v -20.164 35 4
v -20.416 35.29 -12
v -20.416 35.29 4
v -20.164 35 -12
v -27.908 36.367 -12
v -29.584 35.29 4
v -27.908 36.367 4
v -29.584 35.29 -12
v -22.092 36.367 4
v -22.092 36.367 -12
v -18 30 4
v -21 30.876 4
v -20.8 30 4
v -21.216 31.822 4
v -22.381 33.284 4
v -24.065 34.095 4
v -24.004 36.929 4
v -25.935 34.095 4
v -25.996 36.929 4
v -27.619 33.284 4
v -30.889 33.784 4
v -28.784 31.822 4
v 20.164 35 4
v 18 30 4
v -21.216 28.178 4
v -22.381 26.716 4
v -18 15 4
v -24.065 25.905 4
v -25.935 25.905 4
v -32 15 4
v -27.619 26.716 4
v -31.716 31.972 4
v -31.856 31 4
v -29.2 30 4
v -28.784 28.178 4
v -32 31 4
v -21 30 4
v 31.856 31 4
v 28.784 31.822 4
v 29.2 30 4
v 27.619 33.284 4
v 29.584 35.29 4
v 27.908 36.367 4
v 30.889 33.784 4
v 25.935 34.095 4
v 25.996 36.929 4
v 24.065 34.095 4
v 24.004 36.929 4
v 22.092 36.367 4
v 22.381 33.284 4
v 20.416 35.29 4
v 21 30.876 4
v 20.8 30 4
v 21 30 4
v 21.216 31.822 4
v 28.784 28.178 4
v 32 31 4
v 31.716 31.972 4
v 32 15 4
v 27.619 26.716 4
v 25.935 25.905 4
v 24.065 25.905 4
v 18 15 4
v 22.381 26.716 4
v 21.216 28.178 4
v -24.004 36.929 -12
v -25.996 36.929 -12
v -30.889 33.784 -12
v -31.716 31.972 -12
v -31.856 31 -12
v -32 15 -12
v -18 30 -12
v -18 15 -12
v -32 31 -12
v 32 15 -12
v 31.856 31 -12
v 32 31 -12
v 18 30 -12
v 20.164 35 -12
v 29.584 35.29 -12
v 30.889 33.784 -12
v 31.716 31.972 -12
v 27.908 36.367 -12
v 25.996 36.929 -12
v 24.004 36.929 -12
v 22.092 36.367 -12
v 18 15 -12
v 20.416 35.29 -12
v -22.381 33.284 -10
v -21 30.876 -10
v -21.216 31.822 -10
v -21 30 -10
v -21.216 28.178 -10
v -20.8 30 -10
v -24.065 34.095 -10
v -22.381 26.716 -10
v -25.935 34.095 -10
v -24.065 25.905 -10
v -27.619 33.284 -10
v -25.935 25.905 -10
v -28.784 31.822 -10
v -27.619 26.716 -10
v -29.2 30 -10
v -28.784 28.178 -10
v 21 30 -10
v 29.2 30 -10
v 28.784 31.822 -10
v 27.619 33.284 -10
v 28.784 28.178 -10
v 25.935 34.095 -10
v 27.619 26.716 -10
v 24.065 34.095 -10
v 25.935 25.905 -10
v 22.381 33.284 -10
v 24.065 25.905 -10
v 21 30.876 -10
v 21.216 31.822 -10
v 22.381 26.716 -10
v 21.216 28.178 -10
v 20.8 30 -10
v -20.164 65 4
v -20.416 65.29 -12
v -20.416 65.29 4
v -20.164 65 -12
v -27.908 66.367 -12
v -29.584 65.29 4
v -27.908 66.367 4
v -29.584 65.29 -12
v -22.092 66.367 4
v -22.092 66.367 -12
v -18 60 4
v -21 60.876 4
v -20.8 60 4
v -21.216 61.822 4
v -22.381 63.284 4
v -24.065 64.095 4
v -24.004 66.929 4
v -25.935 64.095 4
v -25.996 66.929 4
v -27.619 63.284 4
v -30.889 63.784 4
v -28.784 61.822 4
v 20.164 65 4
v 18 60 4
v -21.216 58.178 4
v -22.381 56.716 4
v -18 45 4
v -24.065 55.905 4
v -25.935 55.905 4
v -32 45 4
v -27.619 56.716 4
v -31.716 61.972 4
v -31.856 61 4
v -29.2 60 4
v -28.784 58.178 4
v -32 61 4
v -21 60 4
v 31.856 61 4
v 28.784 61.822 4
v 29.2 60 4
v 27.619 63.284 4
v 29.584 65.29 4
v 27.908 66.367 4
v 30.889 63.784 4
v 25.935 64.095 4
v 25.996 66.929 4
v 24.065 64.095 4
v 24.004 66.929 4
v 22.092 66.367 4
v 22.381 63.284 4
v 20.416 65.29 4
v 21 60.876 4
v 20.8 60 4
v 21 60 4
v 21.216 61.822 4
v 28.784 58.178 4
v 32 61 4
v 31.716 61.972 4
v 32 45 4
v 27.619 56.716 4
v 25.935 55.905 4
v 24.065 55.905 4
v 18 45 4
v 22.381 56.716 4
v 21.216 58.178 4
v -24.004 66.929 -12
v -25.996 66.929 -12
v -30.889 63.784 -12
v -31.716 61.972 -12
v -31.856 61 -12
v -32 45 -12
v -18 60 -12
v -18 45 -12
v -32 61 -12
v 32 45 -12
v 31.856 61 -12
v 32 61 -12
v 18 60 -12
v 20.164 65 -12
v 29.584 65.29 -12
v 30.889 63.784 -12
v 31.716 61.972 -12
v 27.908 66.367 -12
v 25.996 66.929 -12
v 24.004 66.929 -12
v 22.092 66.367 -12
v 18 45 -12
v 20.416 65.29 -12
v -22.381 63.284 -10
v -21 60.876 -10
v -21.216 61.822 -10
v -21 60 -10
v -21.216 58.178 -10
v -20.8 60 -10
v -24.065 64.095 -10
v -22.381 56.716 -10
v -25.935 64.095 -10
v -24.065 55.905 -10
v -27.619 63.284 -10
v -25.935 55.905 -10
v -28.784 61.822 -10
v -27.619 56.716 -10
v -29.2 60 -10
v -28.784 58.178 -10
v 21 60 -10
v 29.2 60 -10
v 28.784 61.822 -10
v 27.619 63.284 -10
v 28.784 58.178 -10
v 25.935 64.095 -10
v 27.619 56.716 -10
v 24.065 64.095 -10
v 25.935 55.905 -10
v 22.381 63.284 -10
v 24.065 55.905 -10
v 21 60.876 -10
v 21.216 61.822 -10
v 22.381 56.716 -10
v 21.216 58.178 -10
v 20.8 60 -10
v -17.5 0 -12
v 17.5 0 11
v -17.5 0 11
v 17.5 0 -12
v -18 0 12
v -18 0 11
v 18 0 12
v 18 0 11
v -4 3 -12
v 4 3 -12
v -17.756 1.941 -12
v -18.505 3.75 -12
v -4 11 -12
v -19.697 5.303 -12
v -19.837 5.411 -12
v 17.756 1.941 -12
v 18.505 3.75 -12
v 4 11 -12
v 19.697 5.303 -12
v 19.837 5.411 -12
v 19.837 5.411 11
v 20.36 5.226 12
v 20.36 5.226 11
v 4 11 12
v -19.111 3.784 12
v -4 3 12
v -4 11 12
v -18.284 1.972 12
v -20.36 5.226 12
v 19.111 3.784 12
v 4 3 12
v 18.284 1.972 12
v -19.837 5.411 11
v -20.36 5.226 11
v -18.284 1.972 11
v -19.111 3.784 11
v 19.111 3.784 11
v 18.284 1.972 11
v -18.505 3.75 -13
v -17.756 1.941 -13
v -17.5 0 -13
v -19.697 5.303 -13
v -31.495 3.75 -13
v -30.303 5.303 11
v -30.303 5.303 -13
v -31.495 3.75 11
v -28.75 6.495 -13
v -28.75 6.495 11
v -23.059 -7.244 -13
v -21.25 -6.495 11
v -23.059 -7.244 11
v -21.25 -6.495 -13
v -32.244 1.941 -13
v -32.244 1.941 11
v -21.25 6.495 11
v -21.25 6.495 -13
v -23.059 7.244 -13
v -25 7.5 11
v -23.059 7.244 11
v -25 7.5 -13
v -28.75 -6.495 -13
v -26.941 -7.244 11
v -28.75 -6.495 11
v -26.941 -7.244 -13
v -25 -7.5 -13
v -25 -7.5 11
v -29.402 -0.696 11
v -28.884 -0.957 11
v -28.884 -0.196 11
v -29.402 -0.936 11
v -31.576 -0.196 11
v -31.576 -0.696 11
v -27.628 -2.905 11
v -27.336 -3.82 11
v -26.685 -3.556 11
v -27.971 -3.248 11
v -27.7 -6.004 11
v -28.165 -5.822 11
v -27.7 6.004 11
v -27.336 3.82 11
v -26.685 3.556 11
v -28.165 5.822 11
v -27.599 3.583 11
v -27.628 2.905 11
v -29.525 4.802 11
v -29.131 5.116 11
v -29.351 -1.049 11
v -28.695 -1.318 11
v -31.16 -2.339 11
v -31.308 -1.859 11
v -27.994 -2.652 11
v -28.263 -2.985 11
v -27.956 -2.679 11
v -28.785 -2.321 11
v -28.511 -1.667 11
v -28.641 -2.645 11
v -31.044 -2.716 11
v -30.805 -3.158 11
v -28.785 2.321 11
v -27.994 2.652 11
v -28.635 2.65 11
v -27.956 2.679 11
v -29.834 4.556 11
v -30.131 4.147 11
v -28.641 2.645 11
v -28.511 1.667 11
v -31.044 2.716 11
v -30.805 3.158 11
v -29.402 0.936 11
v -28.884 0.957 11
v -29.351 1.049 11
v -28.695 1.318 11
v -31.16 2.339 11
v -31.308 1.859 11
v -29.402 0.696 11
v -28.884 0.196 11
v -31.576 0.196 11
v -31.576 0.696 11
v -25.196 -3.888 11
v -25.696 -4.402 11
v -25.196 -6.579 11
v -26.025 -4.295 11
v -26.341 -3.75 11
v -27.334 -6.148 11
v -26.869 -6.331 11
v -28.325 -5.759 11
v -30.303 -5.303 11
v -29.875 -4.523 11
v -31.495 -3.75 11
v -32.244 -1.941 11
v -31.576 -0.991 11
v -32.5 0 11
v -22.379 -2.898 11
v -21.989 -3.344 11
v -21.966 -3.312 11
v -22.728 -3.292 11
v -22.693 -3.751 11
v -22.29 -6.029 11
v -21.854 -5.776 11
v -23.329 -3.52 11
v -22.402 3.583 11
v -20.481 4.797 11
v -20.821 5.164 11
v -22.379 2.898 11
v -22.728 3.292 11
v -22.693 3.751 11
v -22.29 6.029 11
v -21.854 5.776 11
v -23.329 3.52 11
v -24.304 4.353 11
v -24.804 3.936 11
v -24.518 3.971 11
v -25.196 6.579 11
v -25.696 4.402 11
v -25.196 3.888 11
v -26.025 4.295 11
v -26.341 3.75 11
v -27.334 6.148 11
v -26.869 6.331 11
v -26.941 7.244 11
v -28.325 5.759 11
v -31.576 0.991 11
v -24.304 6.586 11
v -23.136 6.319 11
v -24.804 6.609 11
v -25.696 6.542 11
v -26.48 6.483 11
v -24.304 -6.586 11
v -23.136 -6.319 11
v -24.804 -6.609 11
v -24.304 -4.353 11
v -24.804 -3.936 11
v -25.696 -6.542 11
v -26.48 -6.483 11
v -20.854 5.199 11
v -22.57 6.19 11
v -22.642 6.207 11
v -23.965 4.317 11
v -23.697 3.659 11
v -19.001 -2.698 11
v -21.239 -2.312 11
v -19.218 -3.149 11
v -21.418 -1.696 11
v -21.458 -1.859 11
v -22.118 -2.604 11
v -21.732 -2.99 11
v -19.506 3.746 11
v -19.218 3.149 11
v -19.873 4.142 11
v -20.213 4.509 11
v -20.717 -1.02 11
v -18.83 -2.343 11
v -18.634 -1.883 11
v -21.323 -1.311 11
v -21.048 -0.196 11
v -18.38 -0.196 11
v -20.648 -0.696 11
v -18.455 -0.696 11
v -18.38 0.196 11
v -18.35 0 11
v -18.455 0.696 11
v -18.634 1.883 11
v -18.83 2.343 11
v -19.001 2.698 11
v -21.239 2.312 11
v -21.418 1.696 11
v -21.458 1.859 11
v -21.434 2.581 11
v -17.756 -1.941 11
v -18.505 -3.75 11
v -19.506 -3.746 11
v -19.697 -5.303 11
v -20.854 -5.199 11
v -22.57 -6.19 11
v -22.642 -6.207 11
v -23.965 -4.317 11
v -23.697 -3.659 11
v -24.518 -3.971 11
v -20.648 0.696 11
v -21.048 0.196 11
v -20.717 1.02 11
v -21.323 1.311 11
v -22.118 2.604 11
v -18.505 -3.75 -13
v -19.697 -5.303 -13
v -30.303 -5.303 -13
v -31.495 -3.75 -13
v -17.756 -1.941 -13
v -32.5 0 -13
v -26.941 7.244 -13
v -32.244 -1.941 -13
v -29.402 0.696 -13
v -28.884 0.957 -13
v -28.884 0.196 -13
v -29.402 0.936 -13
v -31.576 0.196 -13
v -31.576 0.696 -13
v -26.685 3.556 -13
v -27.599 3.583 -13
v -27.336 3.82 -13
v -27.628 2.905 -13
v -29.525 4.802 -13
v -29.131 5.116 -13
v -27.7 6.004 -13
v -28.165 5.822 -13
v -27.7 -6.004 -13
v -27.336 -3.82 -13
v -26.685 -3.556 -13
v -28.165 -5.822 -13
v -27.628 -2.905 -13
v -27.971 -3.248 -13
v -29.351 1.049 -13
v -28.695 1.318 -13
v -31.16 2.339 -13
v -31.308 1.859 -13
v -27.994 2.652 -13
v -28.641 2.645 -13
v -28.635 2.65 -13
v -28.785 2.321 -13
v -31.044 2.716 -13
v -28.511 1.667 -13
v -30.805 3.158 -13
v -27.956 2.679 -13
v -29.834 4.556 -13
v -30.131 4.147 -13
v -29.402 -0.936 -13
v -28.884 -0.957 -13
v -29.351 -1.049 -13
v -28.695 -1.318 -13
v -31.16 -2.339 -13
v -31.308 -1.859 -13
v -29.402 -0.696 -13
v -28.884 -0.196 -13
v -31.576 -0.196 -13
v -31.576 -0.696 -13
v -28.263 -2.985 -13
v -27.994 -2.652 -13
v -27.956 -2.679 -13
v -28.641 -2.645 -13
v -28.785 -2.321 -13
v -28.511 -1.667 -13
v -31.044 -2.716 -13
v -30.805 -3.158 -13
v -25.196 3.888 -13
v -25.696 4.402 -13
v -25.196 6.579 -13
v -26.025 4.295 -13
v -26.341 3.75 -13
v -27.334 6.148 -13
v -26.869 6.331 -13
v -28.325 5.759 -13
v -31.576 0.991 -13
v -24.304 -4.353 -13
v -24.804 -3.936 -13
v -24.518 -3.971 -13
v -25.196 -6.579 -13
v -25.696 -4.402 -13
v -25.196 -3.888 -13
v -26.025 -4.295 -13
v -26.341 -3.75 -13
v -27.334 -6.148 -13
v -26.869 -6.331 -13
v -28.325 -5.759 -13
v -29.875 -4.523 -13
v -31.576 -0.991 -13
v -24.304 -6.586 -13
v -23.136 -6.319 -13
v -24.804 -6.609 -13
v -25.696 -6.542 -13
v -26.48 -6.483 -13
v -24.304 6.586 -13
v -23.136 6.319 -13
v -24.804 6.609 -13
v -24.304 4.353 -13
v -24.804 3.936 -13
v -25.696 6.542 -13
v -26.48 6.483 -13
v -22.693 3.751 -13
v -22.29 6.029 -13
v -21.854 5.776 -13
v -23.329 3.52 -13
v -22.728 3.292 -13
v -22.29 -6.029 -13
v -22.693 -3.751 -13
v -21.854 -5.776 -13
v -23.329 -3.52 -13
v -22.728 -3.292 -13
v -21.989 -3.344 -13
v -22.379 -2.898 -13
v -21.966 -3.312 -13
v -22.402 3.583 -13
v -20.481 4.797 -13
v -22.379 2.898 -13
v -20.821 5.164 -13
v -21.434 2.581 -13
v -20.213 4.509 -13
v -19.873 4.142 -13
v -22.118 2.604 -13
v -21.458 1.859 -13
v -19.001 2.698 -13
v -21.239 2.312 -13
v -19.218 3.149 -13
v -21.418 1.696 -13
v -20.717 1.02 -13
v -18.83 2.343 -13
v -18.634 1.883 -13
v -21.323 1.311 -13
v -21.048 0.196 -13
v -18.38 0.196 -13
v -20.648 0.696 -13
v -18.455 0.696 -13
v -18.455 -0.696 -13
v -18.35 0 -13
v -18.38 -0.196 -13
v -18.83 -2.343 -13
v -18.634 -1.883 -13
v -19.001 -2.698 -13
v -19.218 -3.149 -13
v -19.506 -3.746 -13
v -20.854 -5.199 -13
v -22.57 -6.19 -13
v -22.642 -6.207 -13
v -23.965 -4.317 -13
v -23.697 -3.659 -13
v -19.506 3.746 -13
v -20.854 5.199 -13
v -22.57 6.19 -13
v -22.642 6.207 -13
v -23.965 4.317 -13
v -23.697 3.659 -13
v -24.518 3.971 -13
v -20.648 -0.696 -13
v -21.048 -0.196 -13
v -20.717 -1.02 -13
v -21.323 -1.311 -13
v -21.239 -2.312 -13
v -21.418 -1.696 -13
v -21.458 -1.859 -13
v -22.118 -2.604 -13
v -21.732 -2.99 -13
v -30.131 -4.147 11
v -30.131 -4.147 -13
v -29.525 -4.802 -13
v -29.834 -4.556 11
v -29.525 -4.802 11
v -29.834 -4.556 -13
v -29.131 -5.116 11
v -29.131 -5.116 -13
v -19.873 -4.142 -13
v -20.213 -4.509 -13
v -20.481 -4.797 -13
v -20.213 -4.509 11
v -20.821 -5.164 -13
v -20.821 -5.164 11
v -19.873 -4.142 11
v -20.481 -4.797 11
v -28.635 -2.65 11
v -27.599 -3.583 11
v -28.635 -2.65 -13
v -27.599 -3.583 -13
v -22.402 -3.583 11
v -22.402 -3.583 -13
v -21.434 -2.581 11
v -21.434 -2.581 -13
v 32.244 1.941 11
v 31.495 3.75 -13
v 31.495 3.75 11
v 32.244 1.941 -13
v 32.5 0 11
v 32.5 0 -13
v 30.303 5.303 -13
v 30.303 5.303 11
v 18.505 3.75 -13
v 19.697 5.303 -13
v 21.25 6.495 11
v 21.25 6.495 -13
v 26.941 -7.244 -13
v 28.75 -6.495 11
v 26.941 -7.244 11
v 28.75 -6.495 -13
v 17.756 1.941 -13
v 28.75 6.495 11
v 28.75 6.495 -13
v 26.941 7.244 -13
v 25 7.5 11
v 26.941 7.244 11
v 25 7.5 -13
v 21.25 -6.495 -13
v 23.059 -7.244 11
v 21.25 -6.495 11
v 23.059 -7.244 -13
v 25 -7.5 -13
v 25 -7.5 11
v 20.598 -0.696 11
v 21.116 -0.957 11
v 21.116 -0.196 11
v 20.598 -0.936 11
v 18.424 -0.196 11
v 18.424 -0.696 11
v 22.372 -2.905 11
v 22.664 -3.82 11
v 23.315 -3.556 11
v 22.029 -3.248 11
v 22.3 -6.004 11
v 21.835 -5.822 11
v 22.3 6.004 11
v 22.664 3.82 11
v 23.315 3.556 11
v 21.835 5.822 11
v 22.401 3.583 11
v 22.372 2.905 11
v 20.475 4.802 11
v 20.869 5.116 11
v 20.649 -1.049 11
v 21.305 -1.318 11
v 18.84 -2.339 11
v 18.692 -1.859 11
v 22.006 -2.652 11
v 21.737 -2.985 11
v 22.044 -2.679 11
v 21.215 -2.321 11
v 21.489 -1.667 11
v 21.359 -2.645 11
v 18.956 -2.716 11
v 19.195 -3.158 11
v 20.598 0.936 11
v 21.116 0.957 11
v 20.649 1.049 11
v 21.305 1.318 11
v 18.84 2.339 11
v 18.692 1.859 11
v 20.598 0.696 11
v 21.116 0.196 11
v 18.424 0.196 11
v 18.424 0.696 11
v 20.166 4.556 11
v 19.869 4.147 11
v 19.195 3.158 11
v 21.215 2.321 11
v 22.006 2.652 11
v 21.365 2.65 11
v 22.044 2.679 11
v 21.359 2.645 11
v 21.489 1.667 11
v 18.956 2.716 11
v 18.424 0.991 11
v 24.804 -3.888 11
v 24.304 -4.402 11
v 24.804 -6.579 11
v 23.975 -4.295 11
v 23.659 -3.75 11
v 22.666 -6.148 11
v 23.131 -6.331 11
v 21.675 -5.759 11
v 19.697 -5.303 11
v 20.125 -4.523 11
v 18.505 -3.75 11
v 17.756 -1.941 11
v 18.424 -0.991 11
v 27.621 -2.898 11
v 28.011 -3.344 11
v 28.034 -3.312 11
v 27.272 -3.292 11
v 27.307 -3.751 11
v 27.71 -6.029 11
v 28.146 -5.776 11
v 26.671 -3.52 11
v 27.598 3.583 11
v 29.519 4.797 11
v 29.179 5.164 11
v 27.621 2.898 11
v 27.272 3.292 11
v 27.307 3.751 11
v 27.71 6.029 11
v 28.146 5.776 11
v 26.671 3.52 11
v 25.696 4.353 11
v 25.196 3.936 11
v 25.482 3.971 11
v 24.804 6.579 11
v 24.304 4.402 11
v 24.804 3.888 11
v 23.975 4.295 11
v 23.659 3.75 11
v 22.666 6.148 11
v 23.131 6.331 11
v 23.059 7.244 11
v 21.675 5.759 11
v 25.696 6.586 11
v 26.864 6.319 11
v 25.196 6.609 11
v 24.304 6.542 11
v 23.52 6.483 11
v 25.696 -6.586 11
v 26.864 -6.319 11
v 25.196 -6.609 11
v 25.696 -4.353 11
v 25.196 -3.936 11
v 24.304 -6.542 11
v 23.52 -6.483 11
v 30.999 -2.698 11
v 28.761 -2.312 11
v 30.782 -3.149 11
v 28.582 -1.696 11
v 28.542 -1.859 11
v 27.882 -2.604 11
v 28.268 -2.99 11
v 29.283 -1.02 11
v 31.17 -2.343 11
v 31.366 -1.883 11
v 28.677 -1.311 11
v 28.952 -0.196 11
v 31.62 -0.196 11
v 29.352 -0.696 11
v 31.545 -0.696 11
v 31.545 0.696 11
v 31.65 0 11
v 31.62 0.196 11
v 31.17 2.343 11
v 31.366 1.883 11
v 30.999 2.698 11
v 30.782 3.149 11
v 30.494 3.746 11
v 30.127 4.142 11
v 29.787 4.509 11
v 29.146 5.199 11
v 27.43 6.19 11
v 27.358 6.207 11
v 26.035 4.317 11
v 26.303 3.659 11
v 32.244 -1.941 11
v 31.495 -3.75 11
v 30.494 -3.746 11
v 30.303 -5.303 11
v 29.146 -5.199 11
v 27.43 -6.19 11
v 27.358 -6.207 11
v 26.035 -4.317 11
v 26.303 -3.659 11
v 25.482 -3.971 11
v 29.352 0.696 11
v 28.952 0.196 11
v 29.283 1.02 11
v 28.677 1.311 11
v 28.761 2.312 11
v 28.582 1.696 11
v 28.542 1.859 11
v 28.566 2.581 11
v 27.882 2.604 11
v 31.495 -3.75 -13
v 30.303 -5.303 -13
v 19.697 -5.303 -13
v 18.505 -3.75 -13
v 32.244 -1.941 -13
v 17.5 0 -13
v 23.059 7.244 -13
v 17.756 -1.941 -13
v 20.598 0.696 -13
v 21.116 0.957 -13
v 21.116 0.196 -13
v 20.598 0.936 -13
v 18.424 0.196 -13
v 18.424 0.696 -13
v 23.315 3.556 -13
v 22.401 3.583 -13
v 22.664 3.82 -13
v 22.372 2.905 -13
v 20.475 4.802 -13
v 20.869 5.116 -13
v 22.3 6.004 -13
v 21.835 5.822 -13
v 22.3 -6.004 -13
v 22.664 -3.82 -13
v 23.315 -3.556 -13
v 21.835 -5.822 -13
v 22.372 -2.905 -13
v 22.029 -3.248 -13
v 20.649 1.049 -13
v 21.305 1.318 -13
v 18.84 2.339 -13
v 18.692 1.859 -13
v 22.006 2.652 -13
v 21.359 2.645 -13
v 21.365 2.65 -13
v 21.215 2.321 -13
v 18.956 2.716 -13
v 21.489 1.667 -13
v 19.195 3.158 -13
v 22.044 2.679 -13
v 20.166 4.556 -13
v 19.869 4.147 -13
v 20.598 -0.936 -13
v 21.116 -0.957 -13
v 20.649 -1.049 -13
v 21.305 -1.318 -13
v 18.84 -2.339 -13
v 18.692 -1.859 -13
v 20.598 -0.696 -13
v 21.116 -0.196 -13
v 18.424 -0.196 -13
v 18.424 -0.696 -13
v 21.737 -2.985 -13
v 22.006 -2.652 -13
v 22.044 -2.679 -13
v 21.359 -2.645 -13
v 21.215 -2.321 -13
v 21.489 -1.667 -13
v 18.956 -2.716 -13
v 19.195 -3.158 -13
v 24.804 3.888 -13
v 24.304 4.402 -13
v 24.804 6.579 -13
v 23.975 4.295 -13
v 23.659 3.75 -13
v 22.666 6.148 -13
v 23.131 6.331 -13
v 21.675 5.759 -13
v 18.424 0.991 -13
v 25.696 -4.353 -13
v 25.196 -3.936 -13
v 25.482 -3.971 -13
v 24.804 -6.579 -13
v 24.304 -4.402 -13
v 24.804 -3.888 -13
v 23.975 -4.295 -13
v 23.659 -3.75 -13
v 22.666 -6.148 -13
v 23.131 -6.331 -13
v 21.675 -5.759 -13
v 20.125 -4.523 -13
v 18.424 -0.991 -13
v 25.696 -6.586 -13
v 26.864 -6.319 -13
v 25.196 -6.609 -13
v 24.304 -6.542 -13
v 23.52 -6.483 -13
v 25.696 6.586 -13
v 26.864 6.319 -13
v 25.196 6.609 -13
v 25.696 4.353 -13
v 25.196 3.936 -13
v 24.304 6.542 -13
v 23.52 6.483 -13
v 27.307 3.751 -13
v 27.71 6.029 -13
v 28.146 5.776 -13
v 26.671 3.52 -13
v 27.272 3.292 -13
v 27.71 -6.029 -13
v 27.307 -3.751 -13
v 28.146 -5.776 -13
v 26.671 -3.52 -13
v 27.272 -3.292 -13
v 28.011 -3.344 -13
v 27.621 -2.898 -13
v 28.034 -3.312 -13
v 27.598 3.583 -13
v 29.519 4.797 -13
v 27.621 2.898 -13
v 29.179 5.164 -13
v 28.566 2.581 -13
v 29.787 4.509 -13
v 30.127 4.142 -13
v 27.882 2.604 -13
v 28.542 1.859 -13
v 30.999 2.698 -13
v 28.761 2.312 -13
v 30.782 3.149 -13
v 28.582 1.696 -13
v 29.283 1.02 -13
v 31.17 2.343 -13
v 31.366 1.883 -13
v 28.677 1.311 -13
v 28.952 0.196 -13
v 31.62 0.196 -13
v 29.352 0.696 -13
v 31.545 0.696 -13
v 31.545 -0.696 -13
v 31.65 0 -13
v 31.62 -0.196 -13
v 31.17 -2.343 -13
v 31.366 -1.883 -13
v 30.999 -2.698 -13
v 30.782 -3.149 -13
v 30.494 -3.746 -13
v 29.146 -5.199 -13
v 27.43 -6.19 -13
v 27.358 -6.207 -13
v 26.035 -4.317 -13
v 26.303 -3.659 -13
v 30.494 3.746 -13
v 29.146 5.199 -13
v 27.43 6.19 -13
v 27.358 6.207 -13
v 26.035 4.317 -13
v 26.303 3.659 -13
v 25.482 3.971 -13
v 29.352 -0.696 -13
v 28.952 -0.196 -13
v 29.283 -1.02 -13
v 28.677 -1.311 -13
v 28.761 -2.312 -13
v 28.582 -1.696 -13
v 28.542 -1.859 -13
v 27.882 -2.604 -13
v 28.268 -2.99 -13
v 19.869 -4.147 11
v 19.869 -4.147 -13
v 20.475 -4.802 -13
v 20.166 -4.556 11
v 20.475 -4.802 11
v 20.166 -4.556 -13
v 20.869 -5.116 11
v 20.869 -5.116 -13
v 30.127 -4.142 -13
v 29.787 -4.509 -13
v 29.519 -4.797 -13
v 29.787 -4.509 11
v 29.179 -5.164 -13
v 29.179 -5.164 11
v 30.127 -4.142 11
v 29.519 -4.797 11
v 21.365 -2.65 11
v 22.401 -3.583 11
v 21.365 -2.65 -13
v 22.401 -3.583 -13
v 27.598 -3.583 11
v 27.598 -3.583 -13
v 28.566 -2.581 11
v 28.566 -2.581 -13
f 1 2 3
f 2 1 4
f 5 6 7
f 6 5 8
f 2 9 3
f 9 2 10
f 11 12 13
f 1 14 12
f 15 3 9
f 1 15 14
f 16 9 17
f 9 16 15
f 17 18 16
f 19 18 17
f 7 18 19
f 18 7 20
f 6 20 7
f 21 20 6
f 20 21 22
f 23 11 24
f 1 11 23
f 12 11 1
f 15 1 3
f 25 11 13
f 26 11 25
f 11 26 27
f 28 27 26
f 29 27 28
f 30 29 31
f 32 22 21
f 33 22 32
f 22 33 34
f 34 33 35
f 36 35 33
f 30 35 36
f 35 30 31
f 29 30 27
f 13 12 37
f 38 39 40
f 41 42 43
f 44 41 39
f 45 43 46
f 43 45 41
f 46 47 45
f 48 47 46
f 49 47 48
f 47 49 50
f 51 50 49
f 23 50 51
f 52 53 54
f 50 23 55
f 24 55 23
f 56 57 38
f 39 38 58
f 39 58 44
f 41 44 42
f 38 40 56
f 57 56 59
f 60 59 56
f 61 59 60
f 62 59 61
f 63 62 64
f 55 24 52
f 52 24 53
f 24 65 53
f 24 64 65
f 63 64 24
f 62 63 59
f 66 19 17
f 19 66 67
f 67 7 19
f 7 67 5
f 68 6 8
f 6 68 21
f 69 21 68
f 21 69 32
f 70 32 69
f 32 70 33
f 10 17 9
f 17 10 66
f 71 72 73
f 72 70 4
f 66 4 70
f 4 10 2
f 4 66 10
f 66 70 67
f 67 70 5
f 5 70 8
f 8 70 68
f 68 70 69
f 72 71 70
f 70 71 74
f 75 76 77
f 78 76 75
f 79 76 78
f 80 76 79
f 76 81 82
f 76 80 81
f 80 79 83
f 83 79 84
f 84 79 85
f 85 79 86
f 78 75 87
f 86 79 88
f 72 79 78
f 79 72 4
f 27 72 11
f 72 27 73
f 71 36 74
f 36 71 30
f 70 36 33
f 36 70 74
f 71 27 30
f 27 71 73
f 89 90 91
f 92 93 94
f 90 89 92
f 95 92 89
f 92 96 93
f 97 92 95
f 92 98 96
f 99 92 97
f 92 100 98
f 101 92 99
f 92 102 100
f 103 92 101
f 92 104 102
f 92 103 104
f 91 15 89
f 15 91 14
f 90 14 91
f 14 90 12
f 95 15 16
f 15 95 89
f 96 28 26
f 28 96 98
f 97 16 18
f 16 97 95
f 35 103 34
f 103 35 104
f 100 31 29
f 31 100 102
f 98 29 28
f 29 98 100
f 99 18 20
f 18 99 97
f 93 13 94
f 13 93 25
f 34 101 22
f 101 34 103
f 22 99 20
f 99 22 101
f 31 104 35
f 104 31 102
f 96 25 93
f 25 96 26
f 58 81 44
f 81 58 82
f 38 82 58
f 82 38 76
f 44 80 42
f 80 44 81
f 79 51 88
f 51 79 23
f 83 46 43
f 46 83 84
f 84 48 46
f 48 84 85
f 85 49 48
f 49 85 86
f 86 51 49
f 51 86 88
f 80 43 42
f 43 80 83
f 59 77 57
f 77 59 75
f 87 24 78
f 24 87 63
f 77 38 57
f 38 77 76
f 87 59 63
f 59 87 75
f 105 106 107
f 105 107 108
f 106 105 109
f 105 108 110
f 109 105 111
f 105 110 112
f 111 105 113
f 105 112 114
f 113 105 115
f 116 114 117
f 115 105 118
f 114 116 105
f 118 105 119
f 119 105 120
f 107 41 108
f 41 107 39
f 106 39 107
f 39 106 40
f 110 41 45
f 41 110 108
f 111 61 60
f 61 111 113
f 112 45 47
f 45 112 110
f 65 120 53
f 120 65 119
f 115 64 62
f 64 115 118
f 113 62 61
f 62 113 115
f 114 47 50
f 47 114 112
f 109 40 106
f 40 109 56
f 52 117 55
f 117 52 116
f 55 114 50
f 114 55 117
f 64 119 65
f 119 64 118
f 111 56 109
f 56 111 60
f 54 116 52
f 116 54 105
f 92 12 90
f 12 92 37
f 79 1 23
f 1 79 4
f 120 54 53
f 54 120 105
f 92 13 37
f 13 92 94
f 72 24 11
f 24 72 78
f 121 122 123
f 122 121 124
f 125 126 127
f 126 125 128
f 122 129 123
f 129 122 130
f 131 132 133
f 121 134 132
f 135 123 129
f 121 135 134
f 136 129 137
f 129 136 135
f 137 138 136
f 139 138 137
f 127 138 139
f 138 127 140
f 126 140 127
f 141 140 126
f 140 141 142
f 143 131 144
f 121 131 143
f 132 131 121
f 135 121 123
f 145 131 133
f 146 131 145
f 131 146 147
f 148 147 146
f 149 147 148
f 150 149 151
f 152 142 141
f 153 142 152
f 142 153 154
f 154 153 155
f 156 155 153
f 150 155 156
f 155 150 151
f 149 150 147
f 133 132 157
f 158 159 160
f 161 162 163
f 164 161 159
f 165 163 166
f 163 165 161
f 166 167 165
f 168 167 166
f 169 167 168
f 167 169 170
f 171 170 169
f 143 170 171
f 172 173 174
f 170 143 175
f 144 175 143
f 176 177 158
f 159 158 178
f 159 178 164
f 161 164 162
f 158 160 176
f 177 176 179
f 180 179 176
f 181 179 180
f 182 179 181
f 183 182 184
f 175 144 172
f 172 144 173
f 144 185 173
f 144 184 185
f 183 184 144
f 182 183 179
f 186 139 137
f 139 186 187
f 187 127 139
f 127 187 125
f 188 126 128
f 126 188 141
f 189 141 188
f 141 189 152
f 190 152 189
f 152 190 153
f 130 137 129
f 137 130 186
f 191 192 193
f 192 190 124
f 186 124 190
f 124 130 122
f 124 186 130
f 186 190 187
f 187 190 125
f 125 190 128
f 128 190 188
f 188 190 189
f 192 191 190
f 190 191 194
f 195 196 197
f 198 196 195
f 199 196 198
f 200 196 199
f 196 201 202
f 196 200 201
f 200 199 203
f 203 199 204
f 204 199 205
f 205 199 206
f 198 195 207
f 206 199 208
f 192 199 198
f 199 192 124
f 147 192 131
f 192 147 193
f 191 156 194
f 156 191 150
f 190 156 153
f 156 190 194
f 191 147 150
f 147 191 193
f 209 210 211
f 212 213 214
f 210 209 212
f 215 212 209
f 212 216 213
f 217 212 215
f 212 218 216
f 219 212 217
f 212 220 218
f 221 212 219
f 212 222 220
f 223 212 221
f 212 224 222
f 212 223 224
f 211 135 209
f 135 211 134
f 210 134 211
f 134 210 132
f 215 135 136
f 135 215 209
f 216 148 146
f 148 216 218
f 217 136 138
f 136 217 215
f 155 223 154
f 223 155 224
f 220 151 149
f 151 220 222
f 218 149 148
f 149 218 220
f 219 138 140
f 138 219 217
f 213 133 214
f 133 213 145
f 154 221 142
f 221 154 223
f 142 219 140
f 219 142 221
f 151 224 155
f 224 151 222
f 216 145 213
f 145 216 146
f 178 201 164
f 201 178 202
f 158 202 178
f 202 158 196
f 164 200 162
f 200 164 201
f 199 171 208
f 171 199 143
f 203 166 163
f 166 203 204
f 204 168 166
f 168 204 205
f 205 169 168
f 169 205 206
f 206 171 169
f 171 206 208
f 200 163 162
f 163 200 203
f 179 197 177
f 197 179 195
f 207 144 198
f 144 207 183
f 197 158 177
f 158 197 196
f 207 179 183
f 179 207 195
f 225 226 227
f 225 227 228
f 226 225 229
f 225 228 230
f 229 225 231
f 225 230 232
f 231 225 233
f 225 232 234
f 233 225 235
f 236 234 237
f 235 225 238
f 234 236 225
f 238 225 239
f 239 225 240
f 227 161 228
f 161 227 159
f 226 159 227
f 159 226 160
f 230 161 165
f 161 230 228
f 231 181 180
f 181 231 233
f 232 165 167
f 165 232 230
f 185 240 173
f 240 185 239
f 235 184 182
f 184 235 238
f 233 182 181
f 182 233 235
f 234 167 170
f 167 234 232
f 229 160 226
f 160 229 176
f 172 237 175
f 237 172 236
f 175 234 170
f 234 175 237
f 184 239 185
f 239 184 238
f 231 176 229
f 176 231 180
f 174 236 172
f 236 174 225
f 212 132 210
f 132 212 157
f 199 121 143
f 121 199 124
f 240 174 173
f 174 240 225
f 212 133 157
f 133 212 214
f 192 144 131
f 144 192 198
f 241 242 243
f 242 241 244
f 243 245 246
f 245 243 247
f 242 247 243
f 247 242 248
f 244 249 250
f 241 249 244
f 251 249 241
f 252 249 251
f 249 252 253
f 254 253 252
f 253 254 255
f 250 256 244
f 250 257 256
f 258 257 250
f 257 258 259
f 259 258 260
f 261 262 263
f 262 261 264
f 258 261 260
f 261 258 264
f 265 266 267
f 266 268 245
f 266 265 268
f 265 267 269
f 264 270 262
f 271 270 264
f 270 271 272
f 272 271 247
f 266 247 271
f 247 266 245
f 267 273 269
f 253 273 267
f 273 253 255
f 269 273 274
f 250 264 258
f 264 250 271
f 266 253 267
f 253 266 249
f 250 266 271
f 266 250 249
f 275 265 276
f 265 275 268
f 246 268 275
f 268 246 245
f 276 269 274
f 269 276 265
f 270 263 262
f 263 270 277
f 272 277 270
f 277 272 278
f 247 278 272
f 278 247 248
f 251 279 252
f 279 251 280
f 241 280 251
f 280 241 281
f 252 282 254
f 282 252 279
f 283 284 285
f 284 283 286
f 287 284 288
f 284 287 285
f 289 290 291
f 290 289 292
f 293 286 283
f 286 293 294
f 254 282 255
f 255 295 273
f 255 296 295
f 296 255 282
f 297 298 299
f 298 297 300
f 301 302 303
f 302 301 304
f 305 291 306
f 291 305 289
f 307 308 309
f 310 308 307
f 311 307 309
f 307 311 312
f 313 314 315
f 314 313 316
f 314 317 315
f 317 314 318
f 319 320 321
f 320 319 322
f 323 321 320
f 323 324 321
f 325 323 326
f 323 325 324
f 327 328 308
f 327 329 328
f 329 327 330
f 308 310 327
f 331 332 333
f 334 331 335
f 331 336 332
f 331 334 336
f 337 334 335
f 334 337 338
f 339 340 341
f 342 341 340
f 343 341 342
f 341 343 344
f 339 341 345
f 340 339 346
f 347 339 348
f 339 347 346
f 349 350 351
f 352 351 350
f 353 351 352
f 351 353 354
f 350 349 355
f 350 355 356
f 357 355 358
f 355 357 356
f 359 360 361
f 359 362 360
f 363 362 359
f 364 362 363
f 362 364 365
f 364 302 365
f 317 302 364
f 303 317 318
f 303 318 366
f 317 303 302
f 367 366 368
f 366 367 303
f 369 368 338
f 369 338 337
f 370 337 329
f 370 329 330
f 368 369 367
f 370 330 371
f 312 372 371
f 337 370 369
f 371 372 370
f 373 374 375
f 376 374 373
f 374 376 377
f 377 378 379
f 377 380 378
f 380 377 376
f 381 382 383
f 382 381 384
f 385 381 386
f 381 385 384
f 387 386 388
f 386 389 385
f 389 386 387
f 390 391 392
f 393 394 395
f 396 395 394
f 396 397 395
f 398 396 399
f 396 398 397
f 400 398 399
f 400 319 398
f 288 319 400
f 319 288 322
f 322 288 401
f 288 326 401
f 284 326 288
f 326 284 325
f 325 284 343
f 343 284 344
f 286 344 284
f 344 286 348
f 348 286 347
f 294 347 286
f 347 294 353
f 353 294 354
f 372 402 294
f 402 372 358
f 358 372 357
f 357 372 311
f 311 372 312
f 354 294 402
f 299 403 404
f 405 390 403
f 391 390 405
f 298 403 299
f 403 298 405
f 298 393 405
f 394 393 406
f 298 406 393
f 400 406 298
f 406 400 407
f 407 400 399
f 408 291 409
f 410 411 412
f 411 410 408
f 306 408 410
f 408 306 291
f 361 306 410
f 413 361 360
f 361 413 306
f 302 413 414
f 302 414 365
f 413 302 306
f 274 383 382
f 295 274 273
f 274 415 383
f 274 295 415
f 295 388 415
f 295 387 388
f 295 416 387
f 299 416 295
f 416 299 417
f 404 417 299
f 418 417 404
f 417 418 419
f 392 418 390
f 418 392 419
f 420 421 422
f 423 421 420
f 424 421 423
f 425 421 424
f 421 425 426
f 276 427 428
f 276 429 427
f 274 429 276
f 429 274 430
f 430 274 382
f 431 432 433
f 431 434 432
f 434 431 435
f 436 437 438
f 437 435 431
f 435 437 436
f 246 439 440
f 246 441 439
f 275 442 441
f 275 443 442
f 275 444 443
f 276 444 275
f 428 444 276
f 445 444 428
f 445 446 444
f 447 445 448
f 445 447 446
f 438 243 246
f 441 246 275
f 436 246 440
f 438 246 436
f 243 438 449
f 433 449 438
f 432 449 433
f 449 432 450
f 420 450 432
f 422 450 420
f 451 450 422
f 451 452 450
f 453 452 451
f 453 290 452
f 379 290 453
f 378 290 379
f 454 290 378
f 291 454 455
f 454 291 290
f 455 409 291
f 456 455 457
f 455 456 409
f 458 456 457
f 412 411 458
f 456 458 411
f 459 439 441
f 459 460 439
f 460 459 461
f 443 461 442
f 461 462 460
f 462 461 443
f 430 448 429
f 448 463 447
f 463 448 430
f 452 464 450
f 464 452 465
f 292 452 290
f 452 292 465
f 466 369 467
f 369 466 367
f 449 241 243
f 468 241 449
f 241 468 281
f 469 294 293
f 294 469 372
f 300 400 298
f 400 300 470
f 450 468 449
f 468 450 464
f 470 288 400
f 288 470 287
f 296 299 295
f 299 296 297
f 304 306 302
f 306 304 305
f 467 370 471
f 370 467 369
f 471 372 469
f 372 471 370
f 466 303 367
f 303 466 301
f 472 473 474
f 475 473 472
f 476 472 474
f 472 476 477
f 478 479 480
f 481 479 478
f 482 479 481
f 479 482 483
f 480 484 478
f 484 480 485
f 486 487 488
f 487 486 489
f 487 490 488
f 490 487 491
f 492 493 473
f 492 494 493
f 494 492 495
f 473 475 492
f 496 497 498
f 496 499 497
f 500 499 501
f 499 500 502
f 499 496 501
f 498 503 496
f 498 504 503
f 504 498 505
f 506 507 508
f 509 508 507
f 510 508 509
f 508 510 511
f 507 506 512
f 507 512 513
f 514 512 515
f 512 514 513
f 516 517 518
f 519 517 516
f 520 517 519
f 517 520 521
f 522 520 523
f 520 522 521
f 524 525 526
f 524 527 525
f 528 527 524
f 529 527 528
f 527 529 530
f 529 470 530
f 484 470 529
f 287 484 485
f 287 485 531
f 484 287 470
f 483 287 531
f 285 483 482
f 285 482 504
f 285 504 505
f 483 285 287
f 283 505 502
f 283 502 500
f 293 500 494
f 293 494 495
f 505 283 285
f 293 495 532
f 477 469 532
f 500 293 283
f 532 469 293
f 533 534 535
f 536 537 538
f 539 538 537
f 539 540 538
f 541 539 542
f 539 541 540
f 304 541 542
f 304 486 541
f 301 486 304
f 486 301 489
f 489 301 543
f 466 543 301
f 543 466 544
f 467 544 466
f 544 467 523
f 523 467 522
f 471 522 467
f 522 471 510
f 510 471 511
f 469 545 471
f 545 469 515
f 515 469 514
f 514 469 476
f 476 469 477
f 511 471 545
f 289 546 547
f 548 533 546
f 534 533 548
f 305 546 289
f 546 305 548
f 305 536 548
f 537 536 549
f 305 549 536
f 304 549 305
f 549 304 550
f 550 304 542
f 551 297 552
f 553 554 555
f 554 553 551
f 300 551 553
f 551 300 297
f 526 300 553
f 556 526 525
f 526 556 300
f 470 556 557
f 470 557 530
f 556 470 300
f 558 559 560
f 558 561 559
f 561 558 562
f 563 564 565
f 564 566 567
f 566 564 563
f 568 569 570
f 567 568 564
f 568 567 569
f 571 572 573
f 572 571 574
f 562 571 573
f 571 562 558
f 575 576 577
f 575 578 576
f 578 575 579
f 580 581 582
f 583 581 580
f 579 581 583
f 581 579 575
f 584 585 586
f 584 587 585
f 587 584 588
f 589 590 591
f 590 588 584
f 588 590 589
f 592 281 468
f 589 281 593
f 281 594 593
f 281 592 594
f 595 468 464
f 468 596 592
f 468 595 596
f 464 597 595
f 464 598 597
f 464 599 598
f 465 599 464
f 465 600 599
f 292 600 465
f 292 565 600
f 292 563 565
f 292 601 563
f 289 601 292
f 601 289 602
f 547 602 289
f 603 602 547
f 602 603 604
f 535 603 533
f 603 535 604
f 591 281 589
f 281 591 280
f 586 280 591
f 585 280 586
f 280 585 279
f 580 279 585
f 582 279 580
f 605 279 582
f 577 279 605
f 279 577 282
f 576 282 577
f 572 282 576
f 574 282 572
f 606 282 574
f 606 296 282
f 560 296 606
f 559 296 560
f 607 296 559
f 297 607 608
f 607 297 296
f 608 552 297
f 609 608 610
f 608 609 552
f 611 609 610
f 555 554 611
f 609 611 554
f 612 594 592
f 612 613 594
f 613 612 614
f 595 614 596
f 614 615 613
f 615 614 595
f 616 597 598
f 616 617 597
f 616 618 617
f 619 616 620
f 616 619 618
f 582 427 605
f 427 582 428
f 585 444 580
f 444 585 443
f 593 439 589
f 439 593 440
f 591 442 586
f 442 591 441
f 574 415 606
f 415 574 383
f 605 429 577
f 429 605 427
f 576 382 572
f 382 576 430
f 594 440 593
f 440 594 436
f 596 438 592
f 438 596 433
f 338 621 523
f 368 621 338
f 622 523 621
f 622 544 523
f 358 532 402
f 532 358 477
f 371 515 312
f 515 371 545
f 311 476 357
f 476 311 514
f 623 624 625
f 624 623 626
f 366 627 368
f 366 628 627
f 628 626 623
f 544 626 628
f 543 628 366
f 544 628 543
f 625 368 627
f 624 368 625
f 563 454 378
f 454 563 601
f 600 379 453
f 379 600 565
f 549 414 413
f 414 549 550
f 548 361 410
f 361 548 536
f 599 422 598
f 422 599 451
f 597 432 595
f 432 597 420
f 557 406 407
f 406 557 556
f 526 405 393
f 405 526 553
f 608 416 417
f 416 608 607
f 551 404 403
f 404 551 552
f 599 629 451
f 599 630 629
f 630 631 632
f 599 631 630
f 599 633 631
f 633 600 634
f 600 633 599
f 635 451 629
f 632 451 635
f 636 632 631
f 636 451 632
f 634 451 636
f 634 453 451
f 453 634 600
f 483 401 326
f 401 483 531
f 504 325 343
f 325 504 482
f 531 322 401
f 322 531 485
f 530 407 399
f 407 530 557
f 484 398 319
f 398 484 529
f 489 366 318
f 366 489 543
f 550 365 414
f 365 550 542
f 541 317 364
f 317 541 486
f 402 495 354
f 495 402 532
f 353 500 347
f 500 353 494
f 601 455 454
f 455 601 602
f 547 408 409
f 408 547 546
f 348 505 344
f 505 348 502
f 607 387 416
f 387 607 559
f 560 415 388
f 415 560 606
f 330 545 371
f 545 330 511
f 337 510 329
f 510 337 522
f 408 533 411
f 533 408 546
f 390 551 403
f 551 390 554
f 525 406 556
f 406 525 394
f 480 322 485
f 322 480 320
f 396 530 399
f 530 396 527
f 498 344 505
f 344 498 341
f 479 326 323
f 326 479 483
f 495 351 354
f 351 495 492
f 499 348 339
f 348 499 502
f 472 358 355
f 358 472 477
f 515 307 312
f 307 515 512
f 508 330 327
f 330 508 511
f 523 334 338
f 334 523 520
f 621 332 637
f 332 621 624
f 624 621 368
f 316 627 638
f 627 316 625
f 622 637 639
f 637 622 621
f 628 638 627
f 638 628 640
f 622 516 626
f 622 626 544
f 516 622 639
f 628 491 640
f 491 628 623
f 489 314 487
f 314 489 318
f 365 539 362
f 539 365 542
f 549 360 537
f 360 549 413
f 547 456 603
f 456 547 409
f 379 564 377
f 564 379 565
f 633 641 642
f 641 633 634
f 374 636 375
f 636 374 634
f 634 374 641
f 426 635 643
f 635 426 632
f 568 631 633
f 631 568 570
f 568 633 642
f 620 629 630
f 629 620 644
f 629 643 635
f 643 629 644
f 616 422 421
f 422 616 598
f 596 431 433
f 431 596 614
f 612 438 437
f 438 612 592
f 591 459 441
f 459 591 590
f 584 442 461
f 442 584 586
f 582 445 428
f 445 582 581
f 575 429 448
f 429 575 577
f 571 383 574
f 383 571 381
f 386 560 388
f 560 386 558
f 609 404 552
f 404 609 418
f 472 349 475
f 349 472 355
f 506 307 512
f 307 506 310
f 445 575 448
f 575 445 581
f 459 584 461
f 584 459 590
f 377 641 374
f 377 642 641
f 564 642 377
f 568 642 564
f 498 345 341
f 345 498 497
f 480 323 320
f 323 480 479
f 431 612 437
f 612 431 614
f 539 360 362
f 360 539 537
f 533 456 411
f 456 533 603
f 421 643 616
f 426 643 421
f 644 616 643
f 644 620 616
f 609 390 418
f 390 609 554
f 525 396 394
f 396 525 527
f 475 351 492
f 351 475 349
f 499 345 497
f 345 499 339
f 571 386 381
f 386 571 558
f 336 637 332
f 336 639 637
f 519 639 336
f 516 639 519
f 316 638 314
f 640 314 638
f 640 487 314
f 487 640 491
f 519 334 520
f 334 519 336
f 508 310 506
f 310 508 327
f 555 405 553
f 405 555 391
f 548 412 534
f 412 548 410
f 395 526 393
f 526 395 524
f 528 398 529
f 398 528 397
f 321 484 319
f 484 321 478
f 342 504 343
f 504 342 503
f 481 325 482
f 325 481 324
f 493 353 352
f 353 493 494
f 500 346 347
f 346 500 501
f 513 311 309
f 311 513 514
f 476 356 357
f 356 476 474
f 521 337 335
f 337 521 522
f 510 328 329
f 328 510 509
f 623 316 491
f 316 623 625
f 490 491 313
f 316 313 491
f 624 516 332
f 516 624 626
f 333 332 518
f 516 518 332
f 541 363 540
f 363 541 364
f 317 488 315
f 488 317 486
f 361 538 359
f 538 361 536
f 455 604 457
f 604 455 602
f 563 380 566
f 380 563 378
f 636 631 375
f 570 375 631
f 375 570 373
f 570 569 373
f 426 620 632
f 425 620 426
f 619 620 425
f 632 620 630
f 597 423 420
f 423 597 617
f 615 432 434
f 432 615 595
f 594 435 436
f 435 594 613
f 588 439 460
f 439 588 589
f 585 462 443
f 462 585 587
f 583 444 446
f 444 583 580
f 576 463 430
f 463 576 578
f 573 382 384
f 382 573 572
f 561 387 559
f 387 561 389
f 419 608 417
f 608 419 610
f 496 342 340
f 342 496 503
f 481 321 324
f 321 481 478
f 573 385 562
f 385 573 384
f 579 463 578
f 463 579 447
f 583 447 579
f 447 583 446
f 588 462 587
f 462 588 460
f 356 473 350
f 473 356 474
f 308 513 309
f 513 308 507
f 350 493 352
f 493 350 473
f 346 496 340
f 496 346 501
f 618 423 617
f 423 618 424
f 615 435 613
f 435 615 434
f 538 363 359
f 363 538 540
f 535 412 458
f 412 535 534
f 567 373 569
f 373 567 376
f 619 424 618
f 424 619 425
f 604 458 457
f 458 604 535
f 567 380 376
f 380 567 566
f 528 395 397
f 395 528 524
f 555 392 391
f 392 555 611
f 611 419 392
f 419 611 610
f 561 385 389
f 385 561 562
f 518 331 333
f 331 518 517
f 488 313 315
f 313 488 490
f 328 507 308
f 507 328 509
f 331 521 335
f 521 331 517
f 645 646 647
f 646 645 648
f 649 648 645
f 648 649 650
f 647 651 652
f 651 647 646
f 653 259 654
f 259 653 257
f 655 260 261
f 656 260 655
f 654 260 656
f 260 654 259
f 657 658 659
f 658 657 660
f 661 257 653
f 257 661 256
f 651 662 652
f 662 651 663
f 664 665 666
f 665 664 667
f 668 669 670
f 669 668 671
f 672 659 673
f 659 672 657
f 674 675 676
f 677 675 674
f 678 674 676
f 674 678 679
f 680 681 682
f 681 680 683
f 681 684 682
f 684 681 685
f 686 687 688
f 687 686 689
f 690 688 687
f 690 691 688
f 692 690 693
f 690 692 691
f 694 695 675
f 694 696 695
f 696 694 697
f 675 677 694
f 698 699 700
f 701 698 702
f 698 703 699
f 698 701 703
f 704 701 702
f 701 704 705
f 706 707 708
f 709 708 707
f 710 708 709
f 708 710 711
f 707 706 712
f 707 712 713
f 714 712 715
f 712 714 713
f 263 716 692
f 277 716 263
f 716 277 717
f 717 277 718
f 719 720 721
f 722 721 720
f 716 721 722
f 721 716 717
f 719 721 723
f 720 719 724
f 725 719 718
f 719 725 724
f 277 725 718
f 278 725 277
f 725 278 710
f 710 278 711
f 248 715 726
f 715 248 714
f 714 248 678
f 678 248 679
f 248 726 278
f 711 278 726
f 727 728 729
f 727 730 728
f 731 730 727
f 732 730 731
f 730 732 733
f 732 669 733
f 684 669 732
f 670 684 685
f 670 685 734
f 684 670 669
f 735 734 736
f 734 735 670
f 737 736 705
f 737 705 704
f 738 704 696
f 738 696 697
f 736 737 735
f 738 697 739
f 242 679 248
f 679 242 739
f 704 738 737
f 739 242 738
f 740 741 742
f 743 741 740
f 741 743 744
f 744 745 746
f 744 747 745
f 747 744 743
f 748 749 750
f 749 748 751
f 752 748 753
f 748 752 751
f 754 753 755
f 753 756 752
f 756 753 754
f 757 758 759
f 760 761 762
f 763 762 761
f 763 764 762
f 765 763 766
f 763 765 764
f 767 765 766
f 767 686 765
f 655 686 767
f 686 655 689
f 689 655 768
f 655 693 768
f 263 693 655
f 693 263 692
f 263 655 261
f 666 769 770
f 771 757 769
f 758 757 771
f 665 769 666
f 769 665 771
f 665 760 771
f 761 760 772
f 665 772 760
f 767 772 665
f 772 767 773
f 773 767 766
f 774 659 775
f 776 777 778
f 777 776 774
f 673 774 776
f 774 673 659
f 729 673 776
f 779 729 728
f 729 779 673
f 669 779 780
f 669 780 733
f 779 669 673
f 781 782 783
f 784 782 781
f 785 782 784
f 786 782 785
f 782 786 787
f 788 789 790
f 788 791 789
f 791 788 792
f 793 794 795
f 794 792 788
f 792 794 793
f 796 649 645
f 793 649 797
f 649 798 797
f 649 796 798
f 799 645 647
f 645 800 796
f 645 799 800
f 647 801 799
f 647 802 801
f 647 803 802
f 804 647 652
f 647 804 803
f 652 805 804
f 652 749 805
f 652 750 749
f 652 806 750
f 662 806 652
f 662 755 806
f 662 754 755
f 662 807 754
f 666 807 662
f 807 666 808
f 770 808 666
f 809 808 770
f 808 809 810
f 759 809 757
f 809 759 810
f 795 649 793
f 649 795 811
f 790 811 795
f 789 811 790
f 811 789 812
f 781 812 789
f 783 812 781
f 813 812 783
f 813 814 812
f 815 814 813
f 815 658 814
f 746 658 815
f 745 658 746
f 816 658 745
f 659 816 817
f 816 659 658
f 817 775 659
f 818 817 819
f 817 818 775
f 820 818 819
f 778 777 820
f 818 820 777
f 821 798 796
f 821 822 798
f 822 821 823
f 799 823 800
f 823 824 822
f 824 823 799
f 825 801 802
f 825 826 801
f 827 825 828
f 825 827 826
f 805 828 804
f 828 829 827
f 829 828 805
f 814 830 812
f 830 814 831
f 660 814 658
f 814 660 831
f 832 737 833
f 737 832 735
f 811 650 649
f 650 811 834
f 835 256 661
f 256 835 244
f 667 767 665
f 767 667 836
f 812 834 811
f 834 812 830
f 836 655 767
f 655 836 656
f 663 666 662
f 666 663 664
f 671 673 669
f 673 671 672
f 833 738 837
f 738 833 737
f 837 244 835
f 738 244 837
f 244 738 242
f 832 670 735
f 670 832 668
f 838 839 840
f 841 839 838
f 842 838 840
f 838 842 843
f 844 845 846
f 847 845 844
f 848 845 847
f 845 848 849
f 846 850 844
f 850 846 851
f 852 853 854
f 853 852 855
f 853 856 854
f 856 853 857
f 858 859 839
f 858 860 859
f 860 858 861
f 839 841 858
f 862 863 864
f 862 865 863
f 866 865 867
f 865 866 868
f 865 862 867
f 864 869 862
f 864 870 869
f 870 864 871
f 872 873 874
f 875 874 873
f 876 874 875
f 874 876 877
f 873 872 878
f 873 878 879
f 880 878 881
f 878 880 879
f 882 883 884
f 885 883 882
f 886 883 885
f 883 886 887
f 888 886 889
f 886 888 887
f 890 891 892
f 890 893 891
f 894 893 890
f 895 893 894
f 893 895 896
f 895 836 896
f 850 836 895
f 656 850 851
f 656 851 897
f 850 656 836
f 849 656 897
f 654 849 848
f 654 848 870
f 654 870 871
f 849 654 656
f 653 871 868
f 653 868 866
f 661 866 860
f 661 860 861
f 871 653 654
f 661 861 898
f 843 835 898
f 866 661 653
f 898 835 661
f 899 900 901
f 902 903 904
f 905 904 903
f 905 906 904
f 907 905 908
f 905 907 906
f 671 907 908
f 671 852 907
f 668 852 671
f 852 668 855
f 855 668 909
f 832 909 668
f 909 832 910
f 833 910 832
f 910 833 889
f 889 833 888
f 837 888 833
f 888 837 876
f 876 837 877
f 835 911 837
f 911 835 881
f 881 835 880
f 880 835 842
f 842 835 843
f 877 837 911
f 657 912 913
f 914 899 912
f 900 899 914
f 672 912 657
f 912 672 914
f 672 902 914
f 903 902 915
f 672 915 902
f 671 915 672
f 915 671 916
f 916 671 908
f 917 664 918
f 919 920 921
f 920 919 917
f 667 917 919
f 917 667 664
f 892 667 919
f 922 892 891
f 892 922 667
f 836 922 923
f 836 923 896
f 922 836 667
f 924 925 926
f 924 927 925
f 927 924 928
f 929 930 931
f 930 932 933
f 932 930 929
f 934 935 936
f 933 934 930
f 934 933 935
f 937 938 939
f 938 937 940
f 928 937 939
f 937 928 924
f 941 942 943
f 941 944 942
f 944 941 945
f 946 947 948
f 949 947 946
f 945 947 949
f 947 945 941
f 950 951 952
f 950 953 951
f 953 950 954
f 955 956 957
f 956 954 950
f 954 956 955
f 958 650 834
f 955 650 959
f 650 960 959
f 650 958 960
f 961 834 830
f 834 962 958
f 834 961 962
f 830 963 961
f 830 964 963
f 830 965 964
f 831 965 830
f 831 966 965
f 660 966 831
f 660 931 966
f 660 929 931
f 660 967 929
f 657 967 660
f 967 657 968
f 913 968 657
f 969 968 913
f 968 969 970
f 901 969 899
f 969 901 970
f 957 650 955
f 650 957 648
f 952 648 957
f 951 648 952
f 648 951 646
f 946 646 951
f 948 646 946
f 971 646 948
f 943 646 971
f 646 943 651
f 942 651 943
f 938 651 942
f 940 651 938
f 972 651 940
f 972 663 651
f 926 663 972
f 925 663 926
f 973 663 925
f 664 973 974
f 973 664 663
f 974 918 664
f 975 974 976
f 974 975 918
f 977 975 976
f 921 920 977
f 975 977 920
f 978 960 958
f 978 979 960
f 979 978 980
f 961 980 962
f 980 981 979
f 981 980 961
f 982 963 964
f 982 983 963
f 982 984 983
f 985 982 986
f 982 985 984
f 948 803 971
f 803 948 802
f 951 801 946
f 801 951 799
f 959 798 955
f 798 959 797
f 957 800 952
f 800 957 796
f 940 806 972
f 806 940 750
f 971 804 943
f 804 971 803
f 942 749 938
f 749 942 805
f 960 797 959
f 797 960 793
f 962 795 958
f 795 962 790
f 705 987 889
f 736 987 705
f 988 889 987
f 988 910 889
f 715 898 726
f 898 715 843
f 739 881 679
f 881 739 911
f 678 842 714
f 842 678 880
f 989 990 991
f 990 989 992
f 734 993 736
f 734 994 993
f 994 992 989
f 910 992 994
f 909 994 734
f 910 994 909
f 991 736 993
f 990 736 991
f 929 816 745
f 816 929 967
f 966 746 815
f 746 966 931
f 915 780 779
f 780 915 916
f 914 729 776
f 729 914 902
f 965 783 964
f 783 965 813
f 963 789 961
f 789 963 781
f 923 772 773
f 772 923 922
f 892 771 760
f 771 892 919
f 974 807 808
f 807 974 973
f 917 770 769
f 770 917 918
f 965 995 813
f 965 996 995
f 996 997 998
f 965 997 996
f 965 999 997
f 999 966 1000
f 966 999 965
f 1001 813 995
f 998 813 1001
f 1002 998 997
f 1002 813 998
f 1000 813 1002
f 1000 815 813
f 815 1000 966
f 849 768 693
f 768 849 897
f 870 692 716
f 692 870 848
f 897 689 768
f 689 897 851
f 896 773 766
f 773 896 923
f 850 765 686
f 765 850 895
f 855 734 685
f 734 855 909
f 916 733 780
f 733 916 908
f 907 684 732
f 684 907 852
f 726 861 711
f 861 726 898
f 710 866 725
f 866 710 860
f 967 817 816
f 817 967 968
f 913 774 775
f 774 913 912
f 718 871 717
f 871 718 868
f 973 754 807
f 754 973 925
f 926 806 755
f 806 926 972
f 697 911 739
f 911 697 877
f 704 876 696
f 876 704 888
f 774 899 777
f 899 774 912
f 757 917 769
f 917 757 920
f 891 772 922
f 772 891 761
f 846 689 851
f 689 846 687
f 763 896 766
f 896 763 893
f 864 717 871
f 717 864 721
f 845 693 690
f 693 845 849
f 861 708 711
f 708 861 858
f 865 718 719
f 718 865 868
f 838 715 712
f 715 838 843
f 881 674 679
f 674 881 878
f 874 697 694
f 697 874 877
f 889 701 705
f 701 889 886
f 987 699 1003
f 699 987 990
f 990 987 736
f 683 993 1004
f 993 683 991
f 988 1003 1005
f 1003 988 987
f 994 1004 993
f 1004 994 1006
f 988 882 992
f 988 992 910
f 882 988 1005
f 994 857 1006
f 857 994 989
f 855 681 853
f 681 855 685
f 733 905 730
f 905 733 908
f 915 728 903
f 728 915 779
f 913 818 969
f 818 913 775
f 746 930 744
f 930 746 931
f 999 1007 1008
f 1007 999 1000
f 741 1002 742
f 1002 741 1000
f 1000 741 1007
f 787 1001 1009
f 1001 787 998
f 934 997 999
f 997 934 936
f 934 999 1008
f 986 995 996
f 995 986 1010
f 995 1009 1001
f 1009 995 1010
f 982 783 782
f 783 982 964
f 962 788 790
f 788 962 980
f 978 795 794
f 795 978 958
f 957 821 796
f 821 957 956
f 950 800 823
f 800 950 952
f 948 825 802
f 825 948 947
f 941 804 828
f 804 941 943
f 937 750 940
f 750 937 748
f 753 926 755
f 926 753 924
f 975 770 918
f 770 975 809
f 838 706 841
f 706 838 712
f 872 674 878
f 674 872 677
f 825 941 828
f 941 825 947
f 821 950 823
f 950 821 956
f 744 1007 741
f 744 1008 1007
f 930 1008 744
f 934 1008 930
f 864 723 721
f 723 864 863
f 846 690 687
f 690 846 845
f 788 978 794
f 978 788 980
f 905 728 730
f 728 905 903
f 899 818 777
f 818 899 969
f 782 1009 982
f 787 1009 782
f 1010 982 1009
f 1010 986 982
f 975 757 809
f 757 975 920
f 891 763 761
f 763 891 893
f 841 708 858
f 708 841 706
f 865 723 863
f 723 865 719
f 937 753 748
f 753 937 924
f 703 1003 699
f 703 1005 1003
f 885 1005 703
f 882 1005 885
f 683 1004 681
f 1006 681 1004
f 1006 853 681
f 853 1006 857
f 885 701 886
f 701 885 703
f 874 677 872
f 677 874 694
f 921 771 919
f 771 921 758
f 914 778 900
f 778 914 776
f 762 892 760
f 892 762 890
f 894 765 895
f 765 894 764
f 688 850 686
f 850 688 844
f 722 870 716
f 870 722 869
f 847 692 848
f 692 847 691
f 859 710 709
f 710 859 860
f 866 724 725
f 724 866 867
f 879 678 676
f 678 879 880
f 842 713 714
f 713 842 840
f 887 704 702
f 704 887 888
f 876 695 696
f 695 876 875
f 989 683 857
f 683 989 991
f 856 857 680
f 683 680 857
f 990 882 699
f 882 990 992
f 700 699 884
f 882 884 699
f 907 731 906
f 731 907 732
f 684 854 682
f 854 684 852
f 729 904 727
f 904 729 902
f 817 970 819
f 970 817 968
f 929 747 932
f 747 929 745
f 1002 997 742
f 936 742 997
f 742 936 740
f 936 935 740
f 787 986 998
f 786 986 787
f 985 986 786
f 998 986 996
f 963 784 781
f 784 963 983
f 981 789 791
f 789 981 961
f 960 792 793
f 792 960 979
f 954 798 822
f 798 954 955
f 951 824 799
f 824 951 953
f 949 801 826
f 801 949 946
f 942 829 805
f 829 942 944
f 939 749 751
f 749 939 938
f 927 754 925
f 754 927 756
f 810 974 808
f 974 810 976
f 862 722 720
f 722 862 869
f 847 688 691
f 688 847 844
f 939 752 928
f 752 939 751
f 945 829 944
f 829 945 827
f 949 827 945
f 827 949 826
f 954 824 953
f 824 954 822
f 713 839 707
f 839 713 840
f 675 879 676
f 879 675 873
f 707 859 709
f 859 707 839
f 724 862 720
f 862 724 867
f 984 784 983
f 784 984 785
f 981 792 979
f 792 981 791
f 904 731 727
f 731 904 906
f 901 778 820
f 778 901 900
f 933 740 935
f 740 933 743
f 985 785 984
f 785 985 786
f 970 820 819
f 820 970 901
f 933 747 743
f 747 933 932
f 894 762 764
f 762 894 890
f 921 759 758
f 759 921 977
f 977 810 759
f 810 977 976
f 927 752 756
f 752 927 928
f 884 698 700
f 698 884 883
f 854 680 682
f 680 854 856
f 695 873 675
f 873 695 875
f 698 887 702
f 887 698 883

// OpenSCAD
// [FL_INDEX: keywords="openscad, 3d_parametric, SLIDE___Smartphone_Slider_-_Customizer_Edition, csg_solid" | COT="Parametric OpenSCAD design from 3DCodeverse"]
// Title: SLIDE | Smartphone Slider - Customizer Edition

//SLIDE | Smart phone_q Slider by isaac budmen @ibudmen
// preview[view:south west, tilt:top diagonal]

// What kind of Smartphone do you have?
type_of_phone = "first"; // [first:iPhone5,second:HTC One X,third:Samsung Galaxy S3,fourth:Lumia 920,fifth:Nexus 4,sixth:Samsung Galaxy Note 2,seventh:Motorola Droid X,eighth:Motorola Droid RazrHD,nineth:Blackberry Bold 9900,tenth:LG Optimus G,eleventh:iPhone4/4s]

// Add end caps to build plate?
print_endcaps = "Yes"; // [Yes,No]

end_vis();

//ENDS

module end(){
union(){
translate([-21,20,-12])cube([42,5,16]);
difference(){
union(){
translate([-25,20,-12])cylinder(16,7,7);
translate([-32,5,-12])cube([14,16,16]);
}
translate([-25,20,-10])cylinder(18,4.2,4.2);
}
difference(){
union(){translate([25,20,-12])cylinder(16,7,7);
translate([18,5,-12])cube([14,16,16]);}
translate([25,20,-10])cylinder(18,4.2,4.2);
}

}};

module end_vis() {
if (print_endcaps == "Yes") {
translate([0,10,0])end();
translate([0,40,0])end();
}
else if (print_endcaps == "No"){
cube([1,1,1]);
}
};

//MAIN

module main(){
difference(){
hull(){
translate([-21,0,0])cube([42,5,24]);
translate([-4,2,0])cube([8,9,24]);
}
translate([0,10,11])phone_type();
translate([-25,0,-1])cylinder(26,7,7);
translate([25,0,-1])cylinder(26,7,7);
};};

module phone_type(){
	if (type_of_phone == "first") {
		cube([8,14,28], center=true);
	} else if (type_of_phone == "second") {
		cube([9.0,14,28], center=true);
	} else if (type_of_phone== "third") {
		cube([8.7,14,28], center=true);
	} else if (type_of_phone == "fourth") {
		cube([10.8,14,28], center=true);
	} else if (type_of_phone == "fifth") {
		cube([9.2,14,28], center=true);
	} else if (type_of_phone == "sixth") {
		cube([9.5,14,28], center=true);
	} else if (type_of_phone == "seventh") {
		cube([10,14,28], center=true);
	} else if (type_of_phone == "eighth") {
		cube([8.5,14,28], center=true);
	} else if (type_of_phone == "nineth") {
		cube([10.6,14,28], center=true);
	} else if (type_of_phone == "tenth") {
		cube([8.6,14,28], center=true);
	} else if (type_of_phone == "eleventh") {
		cube([9.4,14,28], center=true);
	} 
};


union(){
translate([0,0,-12])main();}

	translate([-25,0,-1])TLB_linearBearing(
							inner_d          = 8, 
							outer_d          = 15,
							h                = 24,
							stringWidth      = 0.5,
							minWallThickness = 0.85, 
							tooths           = 16, 
							toothRatio       = 0.25);

	translate([25,0,-1])TLB_linearBearing(
							inner_d          = 8, 
							outer_d          = 15,
							h                = 24,
							stringWidth      = 0.5,
							minWallThickness = 0.85, 
							tooths           = 16, 
							toothRatio       = 0.25);







// LINEAR BEARING CODE by Krallinger Sebastian
// ************* units.scad ************* //
mm = 1;
cm = 10 * mm;
dm = 100 * mm;
m = 1000 * mm;

inch = 25.4 * mm;

X = [1, 0, 0];
Y = [0, 1, 0];
Z = [0, 0, 1];

M3 = 3*mm;
M4 = 4*mm;
M5 = 5*mm;
M6 = 6*mm;
M8 = 8*mm;



epsilon = 0.01*mm;
OS = epsilon;

// ************* toothedLinearBearing.scad ************* //


/**
* @brief Toothed Linear Bearing (TLB).
*
* Linear Bearing with parallel triagnles towards the center.
* @param inner_d Inner diameter (Axis Diameter)
* @param outer_d outer diameter (holder Diameter)
* @param h height
* @param stringWidth width of an single string of your printer (this defines the width of the tooth walls)
* @param minWallThickness minimum thickness of the outer wall.
* @param tooths number of toohts on the innside
* @param toothRatio coverd length of the inner ring
**/
module TLB_linearBearing(
inner_d = 8,
outer_d = 15,
h = 24,
stringWidth = 0.5,
minWallThickness = 0.85,
tooths = 16,
toothRatio = 0.25
) {

stringWidth = stringWidth; //!< the layer width of one string

TLB_innerD = inner_d;
TLB_outerD = outer_d;
TLB_minWallThickness = minWallThickness;
TLB_h = h;
TLB_tooths = tooths;

TLB_toothRate = toothRatio;


gapWidth = (TLB_innerD*PI)/TLB_tooths *TLB_toothRate;
//echo(str("gap Width: ", gapWidth));
middR = TLB_outerD/2- TLB_minWallThickness;

//outer ring
difference() {
cylinder(r=TLB_outerD/2, h=TLB_h, center=true);
cylinder(r=middR, h=TLB_h+2*OS, center=true);
}


difference() {
union(){
cylinder(r=TLB_innerD/2 + stringWidth, h=TLB_h, center=true);

for (i=[0:360 / TLB_tooths : 360]) {
rotate(a=i,v=Z) translate([-(gapWidth+2*stringWidth)/2, 0, -TLB_h/2])
cube(size=[gapWidth+2*stringWidth, middR+OS, TLB_h], center=false);
}
}
union(){
cylinder(r=TLB_innerD/2, h=TLB_h+2*OS, center=true);

for (i=[0:360 / TLB_tooths : 360]) {
rotate(a=i,v=Z) translate([-gapWidth/2, 0, -TLB_h/2-OS])
cube(size=[gapWidth, middR, TLB_h+2*OS], center=false);
}
}
}

};
